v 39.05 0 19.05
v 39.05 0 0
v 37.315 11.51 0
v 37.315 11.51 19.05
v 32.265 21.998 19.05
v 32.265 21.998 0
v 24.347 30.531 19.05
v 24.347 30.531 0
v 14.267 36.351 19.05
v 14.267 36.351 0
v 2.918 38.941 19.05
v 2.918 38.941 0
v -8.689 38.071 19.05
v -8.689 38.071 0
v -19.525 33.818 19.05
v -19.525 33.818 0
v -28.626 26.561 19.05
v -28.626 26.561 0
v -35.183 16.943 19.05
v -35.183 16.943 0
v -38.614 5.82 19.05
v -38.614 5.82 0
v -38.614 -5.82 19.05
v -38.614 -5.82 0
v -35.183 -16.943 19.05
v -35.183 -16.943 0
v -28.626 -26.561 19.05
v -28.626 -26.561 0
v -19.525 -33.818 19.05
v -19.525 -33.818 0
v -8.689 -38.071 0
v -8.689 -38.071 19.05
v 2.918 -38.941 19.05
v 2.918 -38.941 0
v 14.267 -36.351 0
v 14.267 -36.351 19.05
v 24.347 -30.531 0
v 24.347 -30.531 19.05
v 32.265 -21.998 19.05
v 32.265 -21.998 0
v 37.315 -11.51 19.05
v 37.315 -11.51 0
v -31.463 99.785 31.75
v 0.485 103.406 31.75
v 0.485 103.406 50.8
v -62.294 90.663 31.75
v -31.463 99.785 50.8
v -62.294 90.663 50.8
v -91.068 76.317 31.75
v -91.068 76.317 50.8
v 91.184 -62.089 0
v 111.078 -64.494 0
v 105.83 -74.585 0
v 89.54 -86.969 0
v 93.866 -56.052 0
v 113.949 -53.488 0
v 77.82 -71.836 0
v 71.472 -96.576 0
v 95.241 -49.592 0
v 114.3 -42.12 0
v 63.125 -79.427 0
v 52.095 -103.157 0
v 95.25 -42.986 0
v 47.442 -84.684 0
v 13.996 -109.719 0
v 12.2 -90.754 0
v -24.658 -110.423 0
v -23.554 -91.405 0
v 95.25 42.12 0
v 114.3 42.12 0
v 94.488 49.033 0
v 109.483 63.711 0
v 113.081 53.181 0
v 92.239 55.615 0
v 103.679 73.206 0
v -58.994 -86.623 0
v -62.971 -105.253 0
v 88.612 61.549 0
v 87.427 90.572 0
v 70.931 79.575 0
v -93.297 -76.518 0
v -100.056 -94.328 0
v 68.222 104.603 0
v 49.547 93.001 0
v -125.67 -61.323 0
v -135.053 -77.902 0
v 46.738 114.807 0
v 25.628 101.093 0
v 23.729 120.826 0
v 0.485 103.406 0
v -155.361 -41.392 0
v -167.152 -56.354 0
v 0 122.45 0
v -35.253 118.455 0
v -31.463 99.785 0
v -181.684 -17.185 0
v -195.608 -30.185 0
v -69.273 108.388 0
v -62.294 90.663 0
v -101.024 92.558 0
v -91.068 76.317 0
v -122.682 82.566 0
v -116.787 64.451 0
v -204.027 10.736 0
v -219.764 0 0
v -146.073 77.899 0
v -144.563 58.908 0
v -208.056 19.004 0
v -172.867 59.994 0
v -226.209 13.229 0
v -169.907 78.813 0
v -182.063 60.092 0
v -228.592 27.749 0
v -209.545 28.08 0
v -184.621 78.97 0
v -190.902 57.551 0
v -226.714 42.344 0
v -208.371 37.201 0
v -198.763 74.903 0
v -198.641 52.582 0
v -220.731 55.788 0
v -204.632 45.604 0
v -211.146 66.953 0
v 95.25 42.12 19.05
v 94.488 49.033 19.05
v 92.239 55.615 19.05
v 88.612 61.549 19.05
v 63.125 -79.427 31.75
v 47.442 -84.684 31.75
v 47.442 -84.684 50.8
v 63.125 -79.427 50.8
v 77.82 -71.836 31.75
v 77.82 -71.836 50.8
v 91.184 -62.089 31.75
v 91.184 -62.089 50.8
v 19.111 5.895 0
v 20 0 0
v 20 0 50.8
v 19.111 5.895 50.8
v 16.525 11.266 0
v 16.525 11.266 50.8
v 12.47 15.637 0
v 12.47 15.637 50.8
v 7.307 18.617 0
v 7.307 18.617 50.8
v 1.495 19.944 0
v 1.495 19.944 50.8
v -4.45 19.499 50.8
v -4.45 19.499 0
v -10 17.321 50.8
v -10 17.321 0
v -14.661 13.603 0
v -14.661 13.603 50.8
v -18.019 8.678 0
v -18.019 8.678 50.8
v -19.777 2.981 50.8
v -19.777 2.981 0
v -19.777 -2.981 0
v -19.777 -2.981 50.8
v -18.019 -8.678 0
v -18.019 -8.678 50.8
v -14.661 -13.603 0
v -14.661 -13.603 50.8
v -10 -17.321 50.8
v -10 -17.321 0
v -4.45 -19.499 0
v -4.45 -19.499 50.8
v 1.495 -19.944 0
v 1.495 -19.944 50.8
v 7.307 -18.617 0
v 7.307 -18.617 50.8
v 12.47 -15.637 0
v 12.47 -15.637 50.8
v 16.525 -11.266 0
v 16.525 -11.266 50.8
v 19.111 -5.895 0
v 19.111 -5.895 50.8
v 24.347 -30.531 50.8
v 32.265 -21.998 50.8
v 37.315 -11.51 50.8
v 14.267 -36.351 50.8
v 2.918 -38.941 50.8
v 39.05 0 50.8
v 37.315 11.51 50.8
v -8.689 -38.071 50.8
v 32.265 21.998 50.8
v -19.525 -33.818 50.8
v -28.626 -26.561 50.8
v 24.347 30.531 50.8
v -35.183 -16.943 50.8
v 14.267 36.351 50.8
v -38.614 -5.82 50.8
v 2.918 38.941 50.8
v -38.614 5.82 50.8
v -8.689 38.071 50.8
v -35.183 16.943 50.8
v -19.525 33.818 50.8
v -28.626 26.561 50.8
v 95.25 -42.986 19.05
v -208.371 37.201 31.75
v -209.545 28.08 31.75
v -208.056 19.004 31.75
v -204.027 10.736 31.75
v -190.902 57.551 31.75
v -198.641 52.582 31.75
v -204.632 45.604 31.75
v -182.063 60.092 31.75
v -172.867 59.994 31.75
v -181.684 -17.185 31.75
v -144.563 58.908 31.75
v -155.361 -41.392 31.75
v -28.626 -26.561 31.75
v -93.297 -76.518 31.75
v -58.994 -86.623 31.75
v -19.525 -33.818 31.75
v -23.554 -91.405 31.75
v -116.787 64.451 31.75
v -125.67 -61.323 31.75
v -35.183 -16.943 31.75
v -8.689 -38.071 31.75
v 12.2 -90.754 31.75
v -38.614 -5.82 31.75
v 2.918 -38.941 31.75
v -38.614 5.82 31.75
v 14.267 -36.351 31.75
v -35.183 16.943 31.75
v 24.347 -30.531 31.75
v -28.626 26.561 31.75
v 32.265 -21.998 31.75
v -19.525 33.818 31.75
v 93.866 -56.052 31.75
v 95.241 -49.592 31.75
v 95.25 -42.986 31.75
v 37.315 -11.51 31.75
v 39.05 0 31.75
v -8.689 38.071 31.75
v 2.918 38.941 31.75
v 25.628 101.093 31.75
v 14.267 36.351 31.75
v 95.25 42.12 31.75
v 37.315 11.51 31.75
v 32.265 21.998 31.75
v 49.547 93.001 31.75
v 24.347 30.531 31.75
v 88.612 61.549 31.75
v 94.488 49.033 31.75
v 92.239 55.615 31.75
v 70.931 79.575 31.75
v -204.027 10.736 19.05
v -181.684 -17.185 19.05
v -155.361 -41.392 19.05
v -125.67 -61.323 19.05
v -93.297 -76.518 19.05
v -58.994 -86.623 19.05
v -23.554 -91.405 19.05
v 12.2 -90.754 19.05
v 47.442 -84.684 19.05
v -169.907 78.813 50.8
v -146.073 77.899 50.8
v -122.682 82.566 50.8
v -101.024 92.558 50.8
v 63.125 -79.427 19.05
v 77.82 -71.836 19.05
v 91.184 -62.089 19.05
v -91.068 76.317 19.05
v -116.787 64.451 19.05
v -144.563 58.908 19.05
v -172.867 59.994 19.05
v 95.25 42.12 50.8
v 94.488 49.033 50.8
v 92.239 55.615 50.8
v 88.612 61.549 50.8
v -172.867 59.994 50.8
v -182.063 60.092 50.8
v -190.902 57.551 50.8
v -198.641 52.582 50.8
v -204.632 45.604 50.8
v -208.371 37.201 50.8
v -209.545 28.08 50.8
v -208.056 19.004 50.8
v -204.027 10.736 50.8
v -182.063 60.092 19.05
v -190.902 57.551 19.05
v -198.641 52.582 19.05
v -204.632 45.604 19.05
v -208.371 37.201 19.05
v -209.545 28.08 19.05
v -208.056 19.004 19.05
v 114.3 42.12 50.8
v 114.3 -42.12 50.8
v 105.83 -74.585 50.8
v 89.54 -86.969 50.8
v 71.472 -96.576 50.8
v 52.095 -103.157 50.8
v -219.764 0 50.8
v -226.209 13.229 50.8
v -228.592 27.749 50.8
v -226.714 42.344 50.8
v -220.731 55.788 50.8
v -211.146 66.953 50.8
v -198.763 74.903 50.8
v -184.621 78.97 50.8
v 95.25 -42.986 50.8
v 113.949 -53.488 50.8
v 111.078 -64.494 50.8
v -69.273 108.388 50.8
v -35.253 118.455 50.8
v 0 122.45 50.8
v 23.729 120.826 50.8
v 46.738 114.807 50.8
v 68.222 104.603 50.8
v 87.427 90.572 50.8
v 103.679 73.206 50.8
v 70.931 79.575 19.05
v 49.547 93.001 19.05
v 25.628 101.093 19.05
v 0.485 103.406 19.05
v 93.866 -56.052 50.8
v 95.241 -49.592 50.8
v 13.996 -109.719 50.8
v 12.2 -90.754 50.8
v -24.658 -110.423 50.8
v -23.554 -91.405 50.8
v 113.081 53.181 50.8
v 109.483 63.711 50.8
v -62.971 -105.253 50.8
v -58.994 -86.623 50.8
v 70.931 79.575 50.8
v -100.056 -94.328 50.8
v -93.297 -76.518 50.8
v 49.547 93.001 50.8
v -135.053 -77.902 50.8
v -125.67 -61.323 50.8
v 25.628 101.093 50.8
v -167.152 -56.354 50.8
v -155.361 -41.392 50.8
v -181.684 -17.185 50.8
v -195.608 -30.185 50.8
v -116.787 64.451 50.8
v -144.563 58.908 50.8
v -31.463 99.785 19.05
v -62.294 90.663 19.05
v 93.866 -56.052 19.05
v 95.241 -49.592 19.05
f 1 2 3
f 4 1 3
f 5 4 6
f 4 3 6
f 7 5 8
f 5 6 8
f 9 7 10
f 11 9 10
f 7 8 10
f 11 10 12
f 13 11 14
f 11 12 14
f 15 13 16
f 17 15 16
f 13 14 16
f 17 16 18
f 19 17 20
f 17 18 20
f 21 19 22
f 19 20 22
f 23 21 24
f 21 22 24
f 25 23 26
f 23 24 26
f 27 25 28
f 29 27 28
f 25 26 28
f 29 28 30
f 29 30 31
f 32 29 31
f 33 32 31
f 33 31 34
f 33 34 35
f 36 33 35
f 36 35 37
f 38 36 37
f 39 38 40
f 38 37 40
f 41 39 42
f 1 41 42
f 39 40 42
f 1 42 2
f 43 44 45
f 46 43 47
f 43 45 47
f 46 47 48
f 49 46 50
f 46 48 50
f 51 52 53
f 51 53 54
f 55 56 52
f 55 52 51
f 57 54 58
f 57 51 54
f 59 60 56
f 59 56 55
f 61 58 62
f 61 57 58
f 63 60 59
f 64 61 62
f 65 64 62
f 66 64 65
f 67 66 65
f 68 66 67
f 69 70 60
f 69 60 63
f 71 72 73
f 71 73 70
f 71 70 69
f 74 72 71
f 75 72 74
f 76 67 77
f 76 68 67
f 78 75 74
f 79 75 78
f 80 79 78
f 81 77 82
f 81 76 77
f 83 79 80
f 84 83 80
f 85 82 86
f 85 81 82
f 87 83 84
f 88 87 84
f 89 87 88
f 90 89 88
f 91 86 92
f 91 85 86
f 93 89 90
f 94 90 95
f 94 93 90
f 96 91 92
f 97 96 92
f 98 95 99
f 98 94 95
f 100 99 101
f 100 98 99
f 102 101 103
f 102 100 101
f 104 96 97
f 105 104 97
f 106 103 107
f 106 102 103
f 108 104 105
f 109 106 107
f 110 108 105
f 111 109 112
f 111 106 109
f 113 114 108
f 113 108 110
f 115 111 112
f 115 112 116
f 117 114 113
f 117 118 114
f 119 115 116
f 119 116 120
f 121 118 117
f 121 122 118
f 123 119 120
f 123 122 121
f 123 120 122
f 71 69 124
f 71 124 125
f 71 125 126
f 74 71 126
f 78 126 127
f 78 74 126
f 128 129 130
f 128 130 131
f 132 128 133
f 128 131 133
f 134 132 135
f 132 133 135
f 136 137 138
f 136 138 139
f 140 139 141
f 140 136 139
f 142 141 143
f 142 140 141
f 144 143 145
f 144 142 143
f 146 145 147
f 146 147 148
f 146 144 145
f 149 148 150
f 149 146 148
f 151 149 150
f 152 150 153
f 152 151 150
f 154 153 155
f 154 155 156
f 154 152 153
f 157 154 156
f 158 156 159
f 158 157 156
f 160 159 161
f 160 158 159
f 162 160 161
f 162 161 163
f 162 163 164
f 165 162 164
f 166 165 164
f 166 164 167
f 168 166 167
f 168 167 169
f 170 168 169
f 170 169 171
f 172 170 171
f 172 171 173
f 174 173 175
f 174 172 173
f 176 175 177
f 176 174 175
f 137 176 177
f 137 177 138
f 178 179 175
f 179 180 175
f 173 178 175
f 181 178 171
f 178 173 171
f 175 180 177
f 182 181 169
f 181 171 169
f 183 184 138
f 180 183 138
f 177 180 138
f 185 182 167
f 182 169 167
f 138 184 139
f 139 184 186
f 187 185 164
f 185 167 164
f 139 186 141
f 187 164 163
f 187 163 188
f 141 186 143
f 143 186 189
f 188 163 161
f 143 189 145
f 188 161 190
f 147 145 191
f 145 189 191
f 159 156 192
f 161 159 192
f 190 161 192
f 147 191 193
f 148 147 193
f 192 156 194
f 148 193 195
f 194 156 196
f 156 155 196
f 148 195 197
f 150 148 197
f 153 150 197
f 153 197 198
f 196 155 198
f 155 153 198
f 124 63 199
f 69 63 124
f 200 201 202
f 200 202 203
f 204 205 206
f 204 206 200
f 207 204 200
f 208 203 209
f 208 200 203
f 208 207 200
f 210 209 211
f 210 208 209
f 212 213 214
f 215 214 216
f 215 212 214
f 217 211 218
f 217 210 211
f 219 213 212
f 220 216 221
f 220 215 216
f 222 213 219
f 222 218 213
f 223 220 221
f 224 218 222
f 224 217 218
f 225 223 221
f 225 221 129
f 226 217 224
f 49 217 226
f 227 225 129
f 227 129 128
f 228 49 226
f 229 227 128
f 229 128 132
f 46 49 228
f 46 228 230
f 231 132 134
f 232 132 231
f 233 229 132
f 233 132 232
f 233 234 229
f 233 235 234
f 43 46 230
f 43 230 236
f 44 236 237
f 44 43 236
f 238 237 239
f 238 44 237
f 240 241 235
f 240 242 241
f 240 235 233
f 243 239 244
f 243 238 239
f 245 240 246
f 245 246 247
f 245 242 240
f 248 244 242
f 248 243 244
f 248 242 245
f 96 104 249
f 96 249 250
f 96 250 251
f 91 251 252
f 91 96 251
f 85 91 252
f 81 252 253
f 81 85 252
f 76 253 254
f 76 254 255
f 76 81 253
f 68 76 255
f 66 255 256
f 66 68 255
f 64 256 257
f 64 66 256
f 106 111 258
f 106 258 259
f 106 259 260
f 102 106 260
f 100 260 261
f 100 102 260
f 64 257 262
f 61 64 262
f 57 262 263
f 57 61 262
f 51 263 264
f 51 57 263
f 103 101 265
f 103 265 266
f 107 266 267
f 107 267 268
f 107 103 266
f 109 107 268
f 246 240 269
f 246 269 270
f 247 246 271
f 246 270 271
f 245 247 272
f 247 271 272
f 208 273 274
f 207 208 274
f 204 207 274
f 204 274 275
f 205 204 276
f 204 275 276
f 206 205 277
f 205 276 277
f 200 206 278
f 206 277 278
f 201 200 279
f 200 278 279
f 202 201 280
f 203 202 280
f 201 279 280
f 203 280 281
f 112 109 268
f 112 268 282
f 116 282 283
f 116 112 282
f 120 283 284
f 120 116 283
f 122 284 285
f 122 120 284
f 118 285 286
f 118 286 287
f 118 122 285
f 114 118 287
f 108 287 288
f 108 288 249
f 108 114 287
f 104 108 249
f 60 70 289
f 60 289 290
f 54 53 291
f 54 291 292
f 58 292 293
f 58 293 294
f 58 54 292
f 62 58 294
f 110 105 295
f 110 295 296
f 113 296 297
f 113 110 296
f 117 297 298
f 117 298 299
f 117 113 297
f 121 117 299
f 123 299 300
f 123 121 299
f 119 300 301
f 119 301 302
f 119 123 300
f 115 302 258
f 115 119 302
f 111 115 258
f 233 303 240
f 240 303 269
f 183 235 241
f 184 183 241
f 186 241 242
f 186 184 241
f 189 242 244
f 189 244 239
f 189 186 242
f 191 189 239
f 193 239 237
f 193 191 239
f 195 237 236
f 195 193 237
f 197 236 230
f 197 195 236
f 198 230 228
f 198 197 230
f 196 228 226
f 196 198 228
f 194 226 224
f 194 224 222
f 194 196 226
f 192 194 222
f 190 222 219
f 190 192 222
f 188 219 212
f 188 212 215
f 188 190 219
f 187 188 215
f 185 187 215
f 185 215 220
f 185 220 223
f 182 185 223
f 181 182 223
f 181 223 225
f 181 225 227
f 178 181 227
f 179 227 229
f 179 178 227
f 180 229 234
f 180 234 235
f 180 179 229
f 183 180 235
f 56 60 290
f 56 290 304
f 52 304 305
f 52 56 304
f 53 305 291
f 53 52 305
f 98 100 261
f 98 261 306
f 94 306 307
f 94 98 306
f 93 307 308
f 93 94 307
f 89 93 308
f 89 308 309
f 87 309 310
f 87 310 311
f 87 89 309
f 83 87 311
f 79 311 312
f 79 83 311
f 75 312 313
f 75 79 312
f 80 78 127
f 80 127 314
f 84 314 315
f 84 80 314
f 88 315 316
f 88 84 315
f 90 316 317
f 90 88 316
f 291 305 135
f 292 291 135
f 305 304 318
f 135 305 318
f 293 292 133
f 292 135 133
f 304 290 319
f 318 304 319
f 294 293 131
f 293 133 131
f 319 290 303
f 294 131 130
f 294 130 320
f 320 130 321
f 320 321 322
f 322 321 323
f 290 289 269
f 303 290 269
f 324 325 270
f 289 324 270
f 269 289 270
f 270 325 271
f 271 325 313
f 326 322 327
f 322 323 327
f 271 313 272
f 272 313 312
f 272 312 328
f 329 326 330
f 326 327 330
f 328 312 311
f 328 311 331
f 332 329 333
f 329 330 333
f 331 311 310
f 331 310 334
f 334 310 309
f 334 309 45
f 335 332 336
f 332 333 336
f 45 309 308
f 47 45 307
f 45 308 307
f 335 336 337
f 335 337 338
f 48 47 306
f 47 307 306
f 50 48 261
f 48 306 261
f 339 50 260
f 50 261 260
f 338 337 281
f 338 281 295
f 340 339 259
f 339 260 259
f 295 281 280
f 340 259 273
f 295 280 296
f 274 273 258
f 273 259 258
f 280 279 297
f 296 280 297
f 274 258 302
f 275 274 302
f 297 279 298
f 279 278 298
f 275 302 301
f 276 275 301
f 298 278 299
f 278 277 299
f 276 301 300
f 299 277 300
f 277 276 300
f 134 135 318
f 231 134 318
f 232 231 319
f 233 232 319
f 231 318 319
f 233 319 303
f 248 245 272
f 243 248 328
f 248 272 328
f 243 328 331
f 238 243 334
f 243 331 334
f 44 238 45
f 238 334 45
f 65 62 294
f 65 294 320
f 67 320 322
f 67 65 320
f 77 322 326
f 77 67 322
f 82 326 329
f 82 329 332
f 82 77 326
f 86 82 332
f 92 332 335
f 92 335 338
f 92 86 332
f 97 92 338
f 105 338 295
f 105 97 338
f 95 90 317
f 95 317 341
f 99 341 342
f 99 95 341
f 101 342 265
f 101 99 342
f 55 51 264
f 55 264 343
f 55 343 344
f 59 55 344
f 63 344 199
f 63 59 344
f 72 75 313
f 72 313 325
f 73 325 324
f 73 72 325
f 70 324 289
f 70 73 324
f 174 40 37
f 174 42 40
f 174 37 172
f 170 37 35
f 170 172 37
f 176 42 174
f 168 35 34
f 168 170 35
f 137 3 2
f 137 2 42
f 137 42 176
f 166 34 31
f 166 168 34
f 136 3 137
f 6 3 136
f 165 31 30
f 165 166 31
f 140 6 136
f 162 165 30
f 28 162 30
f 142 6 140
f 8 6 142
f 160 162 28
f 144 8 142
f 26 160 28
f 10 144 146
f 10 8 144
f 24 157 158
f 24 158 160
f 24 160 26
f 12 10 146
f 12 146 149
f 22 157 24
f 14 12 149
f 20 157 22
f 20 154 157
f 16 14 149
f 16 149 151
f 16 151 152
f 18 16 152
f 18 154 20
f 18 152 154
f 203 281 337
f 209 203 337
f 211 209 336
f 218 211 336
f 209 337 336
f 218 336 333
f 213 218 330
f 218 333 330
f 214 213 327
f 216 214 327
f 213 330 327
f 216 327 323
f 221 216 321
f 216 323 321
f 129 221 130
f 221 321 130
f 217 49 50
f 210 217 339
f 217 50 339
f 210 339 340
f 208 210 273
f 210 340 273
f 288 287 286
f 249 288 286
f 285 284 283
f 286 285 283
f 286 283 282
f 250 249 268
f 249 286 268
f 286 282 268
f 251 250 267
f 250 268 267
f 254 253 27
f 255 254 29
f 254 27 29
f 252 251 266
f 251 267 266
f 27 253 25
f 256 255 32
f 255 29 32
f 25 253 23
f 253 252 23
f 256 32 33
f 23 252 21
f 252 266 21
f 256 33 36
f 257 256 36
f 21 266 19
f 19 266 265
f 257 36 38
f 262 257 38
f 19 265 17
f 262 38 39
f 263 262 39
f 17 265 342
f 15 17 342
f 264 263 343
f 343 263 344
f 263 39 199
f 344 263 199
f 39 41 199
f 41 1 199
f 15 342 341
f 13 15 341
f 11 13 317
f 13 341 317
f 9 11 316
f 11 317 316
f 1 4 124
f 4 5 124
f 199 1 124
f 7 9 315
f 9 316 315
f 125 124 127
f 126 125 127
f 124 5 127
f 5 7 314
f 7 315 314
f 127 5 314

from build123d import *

# Parameters (mm, degrees)
SKETCH1_R           = 20
BOSS_EXTRUDE1_DEPTH = 50.8
SKETCH2_R           = 39.05
CUT_EXTRUDE2_DEPTH  = 19.05


with BuildPart() as part:
    # Sketch1 → Boss-Extrude1 (new body)
    with BuildSketch(Plane.XY):
        with BuildLine():
            Line((114.3, 42.12), (114.3, -42.12))
            ThreePointArc((114.3, -42.12), (112.822576646, -59.071852399), (105.83, -74.584813154))
            ThreePointArc((105.83, -74.584813154), (80.699418732, -92.137099347), (52.095309818, -103.156800734))
            ThreePointArc((52.095309818, -103.156800734), (-100.055730281, -94.328415864), (-219.763830855, 0))
            ThreePointArc((-219.763830855, 0), (-220.731129195, 55.788021762), (-169.90706285, 78.813080248))
            ThreePointArc((-169.90706285, 78.813080248), (-134.239730538, 79.543465906), (-101.023628706, 92.558174376))
            ThreePointArc((-101.023628706, 92.558174376), (-52.482772845, 114.165280445), (0, 122.450223109))
            ThreePointArc((0, 122.450223109), (57.719827825, 110.208823216), (103.678545425, 73.205760206))
            ThreePointArc((103.678545425, 73.205760206), (111.571353775, 58.545131543), (114.3, 42.12))
        make_face()
        Circle(SKETCH1_R, mode=Mode.SUBTRACT)
    extrude(amount=BOSS_EXTRUDE1_DEPTH)

    # Sketch2 → Cut-Extrude2 (cut)
    with BuildSketch(Plane.XY.offset(50.8)):
        with BuildLine():
            ThreePointArc((95.25, 42.12), (93.54459611, 52.385707215), (88.61159089, 61.548600129))
            ThreePointArc((88.61159089, 61.548600129), (49.546680931, 93.001203687), (0.484827279, 103.406393597))
            ThreePointArc((0.484827279, 103.406393597), (-47.077685611, 95.898164307), (-91.067836236, 76.316724432))
            ThreePointArc((-91.067836236, 76.316724432), (-130.511957161, 60.861758124), (-172.866914281, 59.994425155))
            ThreePointArc((-172.866914281, 59.994425155), (-204.631955747, 45.603763601), (-204.027394284, 10.73625))
            ThreePointArc((-204.027394284, 10.73625), (-93.297401253, -76.517534674), (47.442310838, -84.683790679))
            ThreePointArc((47.442310838, -84.683790679), (70.618294037, -75.913232441), (91.183680686, -62.088842363))
            ThreePointArc((91.183680686, -62.088842363), (94.722194745, -52.857883684), (95.25, -42.986049939))
            Line((95.25, -42.986049939), (95.25, 42.12))
        make_face()
        Circle(SKETCH2_R, mode=Mode.SUBTRACT)
    cut_extrude2 = extrude(amount=-CUT_EXTRUDE2_DEPTH, mode=Mode.SUBTRACT)

    # Mirror5: Cut-Extrude2 across plane
    add(cut_extrude2.mirror(Plane.XY.offset(25.4)), mode=Mode.SUBTRACT)


solid = part.part
